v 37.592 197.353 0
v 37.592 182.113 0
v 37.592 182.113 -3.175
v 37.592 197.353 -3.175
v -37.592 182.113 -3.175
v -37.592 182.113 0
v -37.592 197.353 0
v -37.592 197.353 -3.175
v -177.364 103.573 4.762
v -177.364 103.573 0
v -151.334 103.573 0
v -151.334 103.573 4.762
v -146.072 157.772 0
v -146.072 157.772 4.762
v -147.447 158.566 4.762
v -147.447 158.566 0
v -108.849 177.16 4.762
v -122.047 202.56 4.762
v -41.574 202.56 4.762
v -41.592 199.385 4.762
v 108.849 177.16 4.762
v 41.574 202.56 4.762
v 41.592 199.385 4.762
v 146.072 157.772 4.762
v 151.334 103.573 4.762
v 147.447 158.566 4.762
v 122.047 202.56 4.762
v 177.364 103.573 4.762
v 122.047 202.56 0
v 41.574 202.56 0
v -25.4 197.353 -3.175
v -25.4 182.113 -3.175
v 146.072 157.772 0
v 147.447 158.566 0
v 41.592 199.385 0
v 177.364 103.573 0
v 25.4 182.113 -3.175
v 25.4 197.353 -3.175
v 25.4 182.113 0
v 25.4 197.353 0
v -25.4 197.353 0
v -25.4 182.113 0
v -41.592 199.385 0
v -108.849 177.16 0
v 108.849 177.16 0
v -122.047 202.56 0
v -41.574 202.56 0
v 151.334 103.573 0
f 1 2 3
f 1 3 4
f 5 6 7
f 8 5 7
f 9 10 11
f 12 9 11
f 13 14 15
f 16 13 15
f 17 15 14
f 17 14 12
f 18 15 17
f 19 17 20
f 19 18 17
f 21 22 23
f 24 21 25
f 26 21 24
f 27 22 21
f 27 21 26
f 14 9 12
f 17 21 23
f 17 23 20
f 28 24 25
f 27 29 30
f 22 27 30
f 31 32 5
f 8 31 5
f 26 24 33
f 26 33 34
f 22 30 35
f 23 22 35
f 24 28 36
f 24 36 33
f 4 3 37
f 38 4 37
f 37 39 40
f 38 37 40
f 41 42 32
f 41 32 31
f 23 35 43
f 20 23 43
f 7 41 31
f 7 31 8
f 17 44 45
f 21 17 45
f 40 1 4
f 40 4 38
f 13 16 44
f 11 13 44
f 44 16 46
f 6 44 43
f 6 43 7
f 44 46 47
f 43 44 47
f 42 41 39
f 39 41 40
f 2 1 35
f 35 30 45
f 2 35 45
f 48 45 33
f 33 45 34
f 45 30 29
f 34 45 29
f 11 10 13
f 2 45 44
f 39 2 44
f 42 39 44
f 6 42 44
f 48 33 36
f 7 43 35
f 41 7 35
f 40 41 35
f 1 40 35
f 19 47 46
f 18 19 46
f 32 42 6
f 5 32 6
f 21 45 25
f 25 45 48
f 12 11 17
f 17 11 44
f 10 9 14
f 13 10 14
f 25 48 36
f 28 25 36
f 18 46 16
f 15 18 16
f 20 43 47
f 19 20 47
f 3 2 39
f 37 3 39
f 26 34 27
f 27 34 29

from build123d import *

# Parameters (mm, degrees)
BOSS_EXTRUDE1_DEPTH = 4.7625
CUT_EXTRUDE2_DEPTH  = 271.489940724
SKETCH3_W           = 12.192
SKETCH3_H           = 15.24
BOSS_EXTRUDE2_DEPTH = 3.175


with BuildPart() as part:
    # Sketch1 → Boss-Extrude1 (new body)
    with BuildSketch(Plane.XY):
        Polygon((-122.047, 202.560020285), (-179.197, 103.573316632), (-151.334076009, 103.573316632), (-108.848772846, 177.160020285), (108.848772846, 177.160020285), (151.334076009, 103.573316632), (179.197, 103.573316632), (122.047, 202.560020285), (41.573947838, 202.560020285), (41.591522776, 199.385068928), (-41.591522776, 199.385068928), (-41.573947838, 202.560020285), align=None)
    extrude(amount=BOSS_EXTRUDE1_DEPTH)

    # Sketch2 → Cut-Extrude2 (cut, through all)
    with BuildSketch(Plane.XY.offset(4.7625)):
        Polygon((183.007, 96.974203056), (181.632184671, 96.180453056), (146.072184671, 157.772179773), (147.447, 158.565929773), align=None)
        Polygon((-183.007, 96.974203056), (-181.632184671, 96.180453056), (-146.072184671, 157.772179773), (-147.447, 158.565929773), align=None)
    extrude(amount=-CUT_EXTRUDE2_DEPTH, mode=Mode.SUBTRACT)

    # Sketch3 → Boss-Extrude2 (add)
    with BuildSketch(Plane(origin=(0, 0, 0), x_dir=(-1, 0, 0), z_dir=(0, 0, -1))):
        with Locations((-31.496, 189.733068928)):
            Rectangle(SKETCH3_W, SKETCH3_H)
        with Locations((31.496, 189.733068928)):
            Rectangle(SKETCH3_W, SKETCH3_H)
    extrude(amount=BOSS_EXTRUDE2_DEPTH)


solid = part.part
